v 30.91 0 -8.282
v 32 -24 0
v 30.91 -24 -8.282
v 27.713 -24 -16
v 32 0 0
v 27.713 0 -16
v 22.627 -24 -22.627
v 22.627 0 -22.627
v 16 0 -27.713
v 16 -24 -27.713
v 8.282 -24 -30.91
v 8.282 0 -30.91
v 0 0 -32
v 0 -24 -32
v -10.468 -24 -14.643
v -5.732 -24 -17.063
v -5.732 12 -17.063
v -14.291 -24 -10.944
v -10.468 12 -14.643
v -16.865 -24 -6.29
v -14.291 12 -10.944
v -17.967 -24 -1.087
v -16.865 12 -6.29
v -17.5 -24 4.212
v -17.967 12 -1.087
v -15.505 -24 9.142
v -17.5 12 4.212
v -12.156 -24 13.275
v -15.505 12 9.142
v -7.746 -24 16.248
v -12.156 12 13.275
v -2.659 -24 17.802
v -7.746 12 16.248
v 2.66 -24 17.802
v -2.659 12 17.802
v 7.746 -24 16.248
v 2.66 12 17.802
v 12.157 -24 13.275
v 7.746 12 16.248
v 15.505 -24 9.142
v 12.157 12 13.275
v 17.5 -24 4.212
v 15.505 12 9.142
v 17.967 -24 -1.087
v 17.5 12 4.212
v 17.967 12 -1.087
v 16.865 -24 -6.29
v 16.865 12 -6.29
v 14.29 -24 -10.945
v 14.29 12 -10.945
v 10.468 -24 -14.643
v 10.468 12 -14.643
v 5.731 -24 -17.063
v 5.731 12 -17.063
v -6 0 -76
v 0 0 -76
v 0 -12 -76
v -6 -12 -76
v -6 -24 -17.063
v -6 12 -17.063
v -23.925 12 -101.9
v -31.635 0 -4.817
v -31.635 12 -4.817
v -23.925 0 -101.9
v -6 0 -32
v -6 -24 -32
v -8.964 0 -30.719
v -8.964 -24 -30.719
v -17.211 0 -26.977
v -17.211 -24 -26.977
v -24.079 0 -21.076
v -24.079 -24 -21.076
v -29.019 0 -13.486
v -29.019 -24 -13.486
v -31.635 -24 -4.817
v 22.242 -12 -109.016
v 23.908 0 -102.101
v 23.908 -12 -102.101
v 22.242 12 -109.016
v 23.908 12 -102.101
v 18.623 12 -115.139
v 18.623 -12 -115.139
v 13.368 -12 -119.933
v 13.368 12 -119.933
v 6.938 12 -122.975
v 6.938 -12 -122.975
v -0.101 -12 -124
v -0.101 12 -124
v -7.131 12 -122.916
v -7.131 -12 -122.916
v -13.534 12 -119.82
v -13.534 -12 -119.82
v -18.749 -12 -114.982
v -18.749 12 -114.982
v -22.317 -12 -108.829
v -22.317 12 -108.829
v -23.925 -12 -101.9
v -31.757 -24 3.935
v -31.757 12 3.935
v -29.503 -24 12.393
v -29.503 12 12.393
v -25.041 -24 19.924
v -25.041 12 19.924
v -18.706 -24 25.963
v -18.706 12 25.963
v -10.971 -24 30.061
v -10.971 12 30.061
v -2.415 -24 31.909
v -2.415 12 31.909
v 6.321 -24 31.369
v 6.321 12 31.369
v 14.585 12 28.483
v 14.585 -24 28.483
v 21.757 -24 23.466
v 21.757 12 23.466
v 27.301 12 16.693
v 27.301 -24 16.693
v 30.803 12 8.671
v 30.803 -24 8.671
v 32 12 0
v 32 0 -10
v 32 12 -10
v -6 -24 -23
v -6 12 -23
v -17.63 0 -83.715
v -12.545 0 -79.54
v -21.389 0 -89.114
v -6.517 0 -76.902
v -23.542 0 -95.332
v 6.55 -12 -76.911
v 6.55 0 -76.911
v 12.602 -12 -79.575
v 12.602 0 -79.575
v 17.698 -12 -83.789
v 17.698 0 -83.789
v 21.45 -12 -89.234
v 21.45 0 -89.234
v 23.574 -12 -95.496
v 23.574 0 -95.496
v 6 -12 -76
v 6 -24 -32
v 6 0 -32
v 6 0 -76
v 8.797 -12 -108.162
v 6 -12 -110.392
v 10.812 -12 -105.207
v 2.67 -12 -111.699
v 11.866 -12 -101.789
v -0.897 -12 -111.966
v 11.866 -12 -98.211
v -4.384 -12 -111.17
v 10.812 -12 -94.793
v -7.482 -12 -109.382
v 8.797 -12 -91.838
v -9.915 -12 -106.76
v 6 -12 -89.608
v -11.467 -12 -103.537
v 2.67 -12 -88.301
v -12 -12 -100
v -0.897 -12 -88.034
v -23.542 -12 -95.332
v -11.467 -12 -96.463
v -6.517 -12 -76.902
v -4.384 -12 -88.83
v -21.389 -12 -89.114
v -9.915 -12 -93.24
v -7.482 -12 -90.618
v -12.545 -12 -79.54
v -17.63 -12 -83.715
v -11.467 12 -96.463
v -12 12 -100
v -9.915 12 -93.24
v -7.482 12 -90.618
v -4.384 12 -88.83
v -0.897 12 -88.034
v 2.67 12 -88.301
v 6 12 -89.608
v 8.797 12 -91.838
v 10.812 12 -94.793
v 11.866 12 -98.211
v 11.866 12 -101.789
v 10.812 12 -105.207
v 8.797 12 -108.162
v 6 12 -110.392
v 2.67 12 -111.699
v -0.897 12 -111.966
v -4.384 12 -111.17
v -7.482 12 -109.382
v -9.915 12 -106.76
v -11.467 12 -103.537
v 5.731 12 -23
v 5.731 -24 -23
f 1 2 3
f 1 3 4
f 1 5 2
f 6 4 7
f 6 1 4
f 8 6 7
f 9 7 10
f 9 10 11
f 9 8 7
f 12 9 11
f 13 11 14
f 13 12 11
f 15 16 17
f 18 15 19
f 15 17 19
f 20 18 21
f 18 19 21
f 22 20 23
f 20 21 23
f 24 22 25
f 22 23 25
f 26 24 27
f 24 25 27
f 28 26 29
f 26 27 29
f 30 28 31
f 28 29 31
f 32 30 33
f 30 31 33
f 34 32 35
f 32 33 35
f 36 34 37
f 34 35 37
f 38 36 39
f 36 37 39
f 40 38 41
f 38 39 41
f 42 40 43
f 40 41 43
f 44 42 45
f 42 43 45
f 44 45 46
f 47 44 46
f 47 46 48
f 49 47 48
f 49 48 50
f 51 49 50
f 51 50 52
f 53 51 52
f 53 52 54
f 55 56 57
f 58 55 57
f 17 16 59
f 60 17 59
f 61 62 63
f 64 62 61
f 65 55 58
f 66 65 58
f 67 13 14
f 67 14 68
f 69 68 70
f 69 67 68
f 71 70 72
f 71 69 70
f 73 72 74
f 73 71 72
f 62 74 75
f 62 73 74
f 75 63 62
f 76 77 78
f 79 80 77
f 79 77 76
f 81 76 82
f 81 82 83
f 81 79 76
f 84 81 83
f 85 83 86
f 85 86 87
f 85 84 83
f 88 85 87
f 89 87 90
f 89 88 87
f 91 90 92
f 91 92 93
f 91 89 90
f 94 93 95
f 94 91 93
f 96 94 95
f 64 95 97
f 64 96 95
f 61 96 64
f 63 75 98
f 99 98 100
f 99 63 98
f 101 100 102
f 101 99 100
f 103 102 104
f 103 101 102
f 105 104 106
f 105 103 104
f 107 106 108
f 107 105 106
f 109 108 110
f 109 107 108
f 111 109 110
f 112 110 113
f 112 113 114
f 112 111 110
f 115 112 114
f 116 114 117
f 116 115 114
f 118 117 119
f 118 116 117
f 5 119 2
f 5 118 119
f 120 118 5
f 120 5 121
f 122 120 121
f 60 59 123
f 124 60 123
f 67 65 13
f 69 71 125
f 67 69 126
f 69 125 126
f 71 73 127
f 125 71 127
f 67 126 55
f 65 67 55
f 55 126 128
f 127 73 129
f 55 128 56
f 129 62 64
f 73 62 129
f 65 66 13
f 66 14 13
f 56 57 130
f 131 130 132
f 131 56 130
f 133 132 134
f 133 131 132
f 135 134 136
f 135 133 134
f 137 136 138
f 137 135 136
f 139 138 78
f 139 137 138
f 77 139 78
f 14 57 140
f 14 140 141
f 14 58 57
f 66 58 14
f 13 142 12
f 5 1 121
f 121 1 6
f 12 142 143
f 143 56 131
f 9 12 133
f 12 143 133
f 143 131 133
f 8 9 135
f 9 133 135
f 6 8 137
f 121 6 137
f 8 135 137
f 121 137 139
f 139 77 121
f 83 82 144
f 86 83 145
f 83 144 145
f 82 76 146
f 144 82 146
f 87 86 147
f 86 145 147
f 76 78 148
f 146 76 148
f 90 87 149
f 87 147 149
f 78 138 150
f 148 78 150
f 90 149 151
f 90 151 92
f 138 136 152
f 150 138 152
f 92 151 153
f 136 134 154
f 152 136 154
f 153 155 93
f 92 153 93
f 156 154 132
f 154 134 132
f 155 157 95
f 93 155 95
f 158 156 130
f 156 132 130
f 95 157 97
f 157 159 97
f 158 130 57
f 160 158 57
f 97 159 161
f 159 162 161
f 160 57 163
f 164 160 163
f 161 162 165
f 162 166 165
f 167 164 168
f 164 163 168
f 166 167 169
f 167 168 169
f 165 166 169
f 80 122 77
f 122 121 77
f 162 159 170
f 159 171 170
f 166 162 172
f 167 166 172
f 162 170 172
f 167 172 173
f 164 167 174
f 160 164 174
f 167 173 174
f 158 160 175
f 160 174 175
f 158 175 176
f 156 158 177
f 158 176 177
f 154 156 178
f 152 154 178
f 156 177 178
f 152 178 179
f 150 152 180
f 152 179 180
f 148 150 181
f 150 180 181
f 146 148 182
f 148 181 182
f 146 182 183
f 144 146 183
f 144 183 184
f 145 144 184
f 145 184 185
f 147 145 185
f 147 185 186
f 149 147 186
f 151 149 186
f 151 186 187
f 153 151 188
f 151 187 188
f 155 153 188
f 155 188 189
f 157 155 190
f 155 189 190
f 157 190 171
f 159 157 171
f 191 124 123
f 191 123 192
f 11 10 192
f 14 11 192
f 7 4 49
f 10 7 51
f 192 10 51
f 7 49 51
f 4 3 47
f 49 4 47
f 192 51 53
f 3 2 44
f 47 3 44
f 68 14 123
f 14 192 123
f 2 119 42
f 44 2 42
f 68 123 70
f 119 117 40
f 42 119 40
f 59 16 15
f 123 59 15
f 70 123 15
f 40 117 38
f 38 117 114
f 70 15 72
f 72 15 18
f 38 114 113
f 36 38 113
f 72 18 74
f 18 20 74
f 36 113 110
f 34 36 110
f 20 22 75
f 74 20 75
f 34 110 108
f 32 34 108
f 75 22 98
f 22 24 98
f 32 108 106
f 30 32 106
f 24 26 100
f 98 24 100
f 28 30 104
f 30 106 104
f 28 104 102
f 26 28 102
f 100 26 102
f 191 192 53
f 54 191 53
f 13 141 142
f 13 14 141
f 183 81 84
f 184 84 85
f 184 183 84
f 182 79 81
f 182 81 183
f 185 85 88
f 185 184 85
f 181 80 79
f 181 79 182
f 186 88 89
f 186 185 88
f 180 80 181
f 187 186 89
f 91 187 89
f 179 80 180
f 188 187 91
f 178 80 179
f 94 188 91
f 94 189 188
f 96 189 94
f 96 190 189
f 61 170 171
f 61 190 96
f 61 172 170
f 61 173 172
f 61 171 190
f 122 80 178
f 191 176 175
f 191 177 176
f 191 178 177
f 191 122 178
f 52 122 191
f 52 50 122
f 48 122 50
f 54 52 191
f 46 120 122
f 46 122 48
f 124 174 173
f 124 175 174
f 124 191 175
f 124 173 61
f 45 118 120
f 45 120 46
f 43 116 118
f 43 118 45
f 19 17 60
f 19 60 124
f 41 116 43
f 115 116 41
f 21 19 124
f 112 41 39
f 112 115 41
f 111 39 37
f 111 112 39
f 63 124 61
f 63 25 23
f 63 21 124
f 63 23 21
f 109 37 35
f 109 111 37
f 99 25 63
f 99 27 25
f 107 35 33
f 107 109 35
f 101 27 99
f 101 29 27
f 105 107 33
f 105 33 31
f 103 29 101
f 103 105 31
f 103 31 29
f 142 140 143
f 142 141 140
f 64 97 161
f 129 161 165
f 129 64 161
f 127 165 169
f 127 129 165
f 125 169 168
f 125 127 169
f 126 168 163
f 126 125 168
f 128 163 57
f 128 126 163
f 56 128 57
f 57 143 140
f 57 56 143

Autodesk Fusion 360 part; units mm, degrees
sketch "Sketch1" plane through (0, 0, 0) normal (0, 1, 0) x (1, 0, 0)
  circle A0 centre (0, 0) radius 32
  circle A1 centre (0, 100) radius 24
  line L0 (32, 0) -> (32, 10)
  line L1 (32, 10) -> (23.9079, 102.1006)
  line L2 (-31.9991, 0.2374) -> (-23.9247, 101.9002)
  dimension "d1" = 64
  dimension "d2" = 48
extrude "Extrude1" add sketch "Sketch1" along normal blind 12 contours A0 A1 L0 L1 L2 makes body 1
sketch "Sketch2" plane through (0, 12, 0) normal (0, 1, 0) x (-1, 0, 0)
  line L0 (-32, -10) -> (-23.9079, -102.1006)
  arc A0 (23.9247, -101.9002) -> (-23.9079, -102.1006) centre (0, -100) ccw
  line L1 (23.9247, -101.9002) -> (31.6354, -4.8167)
  arc A1 (-32, 0) -> (31.6354, -4.8167) centre (0, 0) ccw
  line L2 (-32, 0) -> (-32, -10)
  circle A2 centre (0, 0) radius 32
  circle A3 centre (0, 0) radius 18
extrude "Extrude2" add sketch "Sketch2" against normal blind 36 contours A1 A2 bodies 1
sketch "Sketch3" plane through (0, 12, 0) normal (0, 1, 0) x (-1, 0, 0)
  circle A0 centre (0, 0) radius 18
  line L0 (-32, -10) -> (-23.9079, -102.1006)
  arc A1 (23.9247, -101.9002) -> (-23.9079, -102.1006) centre (0, -100) ccw
  line L1 (23.9247, -101.9002) -> (31.6354, -4.8167)
  arc A2 (31.6354, -4.8167) -> (-32, 0) centre (0, 0) ccw
  line L2 (-32, 0) -> (-32, -10)
  circle A3 centre (0, -100) radius 24
  circle A4 centre (0, -100) radius 12
  dimension "d7" = 24
extrude "Extrude3" add sketch "Sketch3" against normal blind 24 contours A1 A3 bodies 1
sketch "Sketch4" plane through (0, 12, 0) normal (0, 1, 0) x (-1, 0, 0)
  circle A0 centre (0, -100) radius 12
  circle A1 centre (0, 0) radius 18
  line L0 (-32, -10) -> (-23.9079, -102.1006)
  arc A2 (-23.9079, -102.1006) -> (23.9247, -101.9002) centre (0, -100) ccw
  line L1 (23.9247, -101.9002) -> (31.6354, -4.8167)
  arc A3 (31.6354, -4.8167) -> (-32, 0) centre (0, 0) ccw
  line L2 (-32, 0) -> (-32, -10)
  line L3 (-5.7314, -17.0631) -> (6, -17.0631)
  line L4 (6, -17.0631) -> (6, -23)
  line L5 (6, -23) -> (-5.7314, -23)
  line L6 (-5.7314, -23) -> (-5.7314, -17.0631)
extrude "Extrude4" cut sketch "Sketch4" against normal blind 36 contours A1 L3 L4 L5 L6 bodies 1
sketch "Sketch5" plane through (0, 0, 0) normal (1, 0, 0) x (0, 1, 0)
  line L0 (-12, -76) -> (-24, -32)
  line L1 (-24, -32) -> (0, -32)
  line L2 (0, -32) -> (0, -76)
  line L3 (0, -76) -> (-12, -76)
extrude "Extrude5" add sketch "Sketch5" along normal blind 6 separate body makes body 2
sketch "Sketch6" plane through (0, 0, 0) normal (-1, 0, 0) x (0, -1, 0)
  line L0 (0, -32) -> (0, -76)
  line L1 (0, -76) -> (12, -76)
  line L2 (12, -76) -> (24, -32)
  line L3 (24, -32) -> (0, -32)
  line L4 (24, -32) -> (0, -32)
  line L5 (0, -76) -> (12, -76)
extrude "Extrude6" add sketch "Sketch6" along normal blind 6 bodies 2 1
sketch "Sketch7" plane through (0, 0, 0) normal (0, 0, 1) x (1, 0, 0)
  spline S0 degree 5 poles (-200, -70) (-199.5071, -70.1071) (-198.5439, -70.3047) (-197.1668, -70.5516) (-195.4683, -70.7802) (-193.5919, -70.8856) (-191.9888, -70.7912) (-190.6902, -70.4741) (-189.725, -69.9134) (-189.1054, -69.1001) (-188.8176, -68.0441) (-188.8364, -67.0173) (-188.9827, -66.1506) (-189.138, -65.5306) (-189.2301, -65.21) knots 0 0 0 0 0 0 0.1 0.2 0.3 0.4 0.5 0.6 0.7 0.8 0.9 1 1 1 1 1 1
  point P0 (-190, -70)
